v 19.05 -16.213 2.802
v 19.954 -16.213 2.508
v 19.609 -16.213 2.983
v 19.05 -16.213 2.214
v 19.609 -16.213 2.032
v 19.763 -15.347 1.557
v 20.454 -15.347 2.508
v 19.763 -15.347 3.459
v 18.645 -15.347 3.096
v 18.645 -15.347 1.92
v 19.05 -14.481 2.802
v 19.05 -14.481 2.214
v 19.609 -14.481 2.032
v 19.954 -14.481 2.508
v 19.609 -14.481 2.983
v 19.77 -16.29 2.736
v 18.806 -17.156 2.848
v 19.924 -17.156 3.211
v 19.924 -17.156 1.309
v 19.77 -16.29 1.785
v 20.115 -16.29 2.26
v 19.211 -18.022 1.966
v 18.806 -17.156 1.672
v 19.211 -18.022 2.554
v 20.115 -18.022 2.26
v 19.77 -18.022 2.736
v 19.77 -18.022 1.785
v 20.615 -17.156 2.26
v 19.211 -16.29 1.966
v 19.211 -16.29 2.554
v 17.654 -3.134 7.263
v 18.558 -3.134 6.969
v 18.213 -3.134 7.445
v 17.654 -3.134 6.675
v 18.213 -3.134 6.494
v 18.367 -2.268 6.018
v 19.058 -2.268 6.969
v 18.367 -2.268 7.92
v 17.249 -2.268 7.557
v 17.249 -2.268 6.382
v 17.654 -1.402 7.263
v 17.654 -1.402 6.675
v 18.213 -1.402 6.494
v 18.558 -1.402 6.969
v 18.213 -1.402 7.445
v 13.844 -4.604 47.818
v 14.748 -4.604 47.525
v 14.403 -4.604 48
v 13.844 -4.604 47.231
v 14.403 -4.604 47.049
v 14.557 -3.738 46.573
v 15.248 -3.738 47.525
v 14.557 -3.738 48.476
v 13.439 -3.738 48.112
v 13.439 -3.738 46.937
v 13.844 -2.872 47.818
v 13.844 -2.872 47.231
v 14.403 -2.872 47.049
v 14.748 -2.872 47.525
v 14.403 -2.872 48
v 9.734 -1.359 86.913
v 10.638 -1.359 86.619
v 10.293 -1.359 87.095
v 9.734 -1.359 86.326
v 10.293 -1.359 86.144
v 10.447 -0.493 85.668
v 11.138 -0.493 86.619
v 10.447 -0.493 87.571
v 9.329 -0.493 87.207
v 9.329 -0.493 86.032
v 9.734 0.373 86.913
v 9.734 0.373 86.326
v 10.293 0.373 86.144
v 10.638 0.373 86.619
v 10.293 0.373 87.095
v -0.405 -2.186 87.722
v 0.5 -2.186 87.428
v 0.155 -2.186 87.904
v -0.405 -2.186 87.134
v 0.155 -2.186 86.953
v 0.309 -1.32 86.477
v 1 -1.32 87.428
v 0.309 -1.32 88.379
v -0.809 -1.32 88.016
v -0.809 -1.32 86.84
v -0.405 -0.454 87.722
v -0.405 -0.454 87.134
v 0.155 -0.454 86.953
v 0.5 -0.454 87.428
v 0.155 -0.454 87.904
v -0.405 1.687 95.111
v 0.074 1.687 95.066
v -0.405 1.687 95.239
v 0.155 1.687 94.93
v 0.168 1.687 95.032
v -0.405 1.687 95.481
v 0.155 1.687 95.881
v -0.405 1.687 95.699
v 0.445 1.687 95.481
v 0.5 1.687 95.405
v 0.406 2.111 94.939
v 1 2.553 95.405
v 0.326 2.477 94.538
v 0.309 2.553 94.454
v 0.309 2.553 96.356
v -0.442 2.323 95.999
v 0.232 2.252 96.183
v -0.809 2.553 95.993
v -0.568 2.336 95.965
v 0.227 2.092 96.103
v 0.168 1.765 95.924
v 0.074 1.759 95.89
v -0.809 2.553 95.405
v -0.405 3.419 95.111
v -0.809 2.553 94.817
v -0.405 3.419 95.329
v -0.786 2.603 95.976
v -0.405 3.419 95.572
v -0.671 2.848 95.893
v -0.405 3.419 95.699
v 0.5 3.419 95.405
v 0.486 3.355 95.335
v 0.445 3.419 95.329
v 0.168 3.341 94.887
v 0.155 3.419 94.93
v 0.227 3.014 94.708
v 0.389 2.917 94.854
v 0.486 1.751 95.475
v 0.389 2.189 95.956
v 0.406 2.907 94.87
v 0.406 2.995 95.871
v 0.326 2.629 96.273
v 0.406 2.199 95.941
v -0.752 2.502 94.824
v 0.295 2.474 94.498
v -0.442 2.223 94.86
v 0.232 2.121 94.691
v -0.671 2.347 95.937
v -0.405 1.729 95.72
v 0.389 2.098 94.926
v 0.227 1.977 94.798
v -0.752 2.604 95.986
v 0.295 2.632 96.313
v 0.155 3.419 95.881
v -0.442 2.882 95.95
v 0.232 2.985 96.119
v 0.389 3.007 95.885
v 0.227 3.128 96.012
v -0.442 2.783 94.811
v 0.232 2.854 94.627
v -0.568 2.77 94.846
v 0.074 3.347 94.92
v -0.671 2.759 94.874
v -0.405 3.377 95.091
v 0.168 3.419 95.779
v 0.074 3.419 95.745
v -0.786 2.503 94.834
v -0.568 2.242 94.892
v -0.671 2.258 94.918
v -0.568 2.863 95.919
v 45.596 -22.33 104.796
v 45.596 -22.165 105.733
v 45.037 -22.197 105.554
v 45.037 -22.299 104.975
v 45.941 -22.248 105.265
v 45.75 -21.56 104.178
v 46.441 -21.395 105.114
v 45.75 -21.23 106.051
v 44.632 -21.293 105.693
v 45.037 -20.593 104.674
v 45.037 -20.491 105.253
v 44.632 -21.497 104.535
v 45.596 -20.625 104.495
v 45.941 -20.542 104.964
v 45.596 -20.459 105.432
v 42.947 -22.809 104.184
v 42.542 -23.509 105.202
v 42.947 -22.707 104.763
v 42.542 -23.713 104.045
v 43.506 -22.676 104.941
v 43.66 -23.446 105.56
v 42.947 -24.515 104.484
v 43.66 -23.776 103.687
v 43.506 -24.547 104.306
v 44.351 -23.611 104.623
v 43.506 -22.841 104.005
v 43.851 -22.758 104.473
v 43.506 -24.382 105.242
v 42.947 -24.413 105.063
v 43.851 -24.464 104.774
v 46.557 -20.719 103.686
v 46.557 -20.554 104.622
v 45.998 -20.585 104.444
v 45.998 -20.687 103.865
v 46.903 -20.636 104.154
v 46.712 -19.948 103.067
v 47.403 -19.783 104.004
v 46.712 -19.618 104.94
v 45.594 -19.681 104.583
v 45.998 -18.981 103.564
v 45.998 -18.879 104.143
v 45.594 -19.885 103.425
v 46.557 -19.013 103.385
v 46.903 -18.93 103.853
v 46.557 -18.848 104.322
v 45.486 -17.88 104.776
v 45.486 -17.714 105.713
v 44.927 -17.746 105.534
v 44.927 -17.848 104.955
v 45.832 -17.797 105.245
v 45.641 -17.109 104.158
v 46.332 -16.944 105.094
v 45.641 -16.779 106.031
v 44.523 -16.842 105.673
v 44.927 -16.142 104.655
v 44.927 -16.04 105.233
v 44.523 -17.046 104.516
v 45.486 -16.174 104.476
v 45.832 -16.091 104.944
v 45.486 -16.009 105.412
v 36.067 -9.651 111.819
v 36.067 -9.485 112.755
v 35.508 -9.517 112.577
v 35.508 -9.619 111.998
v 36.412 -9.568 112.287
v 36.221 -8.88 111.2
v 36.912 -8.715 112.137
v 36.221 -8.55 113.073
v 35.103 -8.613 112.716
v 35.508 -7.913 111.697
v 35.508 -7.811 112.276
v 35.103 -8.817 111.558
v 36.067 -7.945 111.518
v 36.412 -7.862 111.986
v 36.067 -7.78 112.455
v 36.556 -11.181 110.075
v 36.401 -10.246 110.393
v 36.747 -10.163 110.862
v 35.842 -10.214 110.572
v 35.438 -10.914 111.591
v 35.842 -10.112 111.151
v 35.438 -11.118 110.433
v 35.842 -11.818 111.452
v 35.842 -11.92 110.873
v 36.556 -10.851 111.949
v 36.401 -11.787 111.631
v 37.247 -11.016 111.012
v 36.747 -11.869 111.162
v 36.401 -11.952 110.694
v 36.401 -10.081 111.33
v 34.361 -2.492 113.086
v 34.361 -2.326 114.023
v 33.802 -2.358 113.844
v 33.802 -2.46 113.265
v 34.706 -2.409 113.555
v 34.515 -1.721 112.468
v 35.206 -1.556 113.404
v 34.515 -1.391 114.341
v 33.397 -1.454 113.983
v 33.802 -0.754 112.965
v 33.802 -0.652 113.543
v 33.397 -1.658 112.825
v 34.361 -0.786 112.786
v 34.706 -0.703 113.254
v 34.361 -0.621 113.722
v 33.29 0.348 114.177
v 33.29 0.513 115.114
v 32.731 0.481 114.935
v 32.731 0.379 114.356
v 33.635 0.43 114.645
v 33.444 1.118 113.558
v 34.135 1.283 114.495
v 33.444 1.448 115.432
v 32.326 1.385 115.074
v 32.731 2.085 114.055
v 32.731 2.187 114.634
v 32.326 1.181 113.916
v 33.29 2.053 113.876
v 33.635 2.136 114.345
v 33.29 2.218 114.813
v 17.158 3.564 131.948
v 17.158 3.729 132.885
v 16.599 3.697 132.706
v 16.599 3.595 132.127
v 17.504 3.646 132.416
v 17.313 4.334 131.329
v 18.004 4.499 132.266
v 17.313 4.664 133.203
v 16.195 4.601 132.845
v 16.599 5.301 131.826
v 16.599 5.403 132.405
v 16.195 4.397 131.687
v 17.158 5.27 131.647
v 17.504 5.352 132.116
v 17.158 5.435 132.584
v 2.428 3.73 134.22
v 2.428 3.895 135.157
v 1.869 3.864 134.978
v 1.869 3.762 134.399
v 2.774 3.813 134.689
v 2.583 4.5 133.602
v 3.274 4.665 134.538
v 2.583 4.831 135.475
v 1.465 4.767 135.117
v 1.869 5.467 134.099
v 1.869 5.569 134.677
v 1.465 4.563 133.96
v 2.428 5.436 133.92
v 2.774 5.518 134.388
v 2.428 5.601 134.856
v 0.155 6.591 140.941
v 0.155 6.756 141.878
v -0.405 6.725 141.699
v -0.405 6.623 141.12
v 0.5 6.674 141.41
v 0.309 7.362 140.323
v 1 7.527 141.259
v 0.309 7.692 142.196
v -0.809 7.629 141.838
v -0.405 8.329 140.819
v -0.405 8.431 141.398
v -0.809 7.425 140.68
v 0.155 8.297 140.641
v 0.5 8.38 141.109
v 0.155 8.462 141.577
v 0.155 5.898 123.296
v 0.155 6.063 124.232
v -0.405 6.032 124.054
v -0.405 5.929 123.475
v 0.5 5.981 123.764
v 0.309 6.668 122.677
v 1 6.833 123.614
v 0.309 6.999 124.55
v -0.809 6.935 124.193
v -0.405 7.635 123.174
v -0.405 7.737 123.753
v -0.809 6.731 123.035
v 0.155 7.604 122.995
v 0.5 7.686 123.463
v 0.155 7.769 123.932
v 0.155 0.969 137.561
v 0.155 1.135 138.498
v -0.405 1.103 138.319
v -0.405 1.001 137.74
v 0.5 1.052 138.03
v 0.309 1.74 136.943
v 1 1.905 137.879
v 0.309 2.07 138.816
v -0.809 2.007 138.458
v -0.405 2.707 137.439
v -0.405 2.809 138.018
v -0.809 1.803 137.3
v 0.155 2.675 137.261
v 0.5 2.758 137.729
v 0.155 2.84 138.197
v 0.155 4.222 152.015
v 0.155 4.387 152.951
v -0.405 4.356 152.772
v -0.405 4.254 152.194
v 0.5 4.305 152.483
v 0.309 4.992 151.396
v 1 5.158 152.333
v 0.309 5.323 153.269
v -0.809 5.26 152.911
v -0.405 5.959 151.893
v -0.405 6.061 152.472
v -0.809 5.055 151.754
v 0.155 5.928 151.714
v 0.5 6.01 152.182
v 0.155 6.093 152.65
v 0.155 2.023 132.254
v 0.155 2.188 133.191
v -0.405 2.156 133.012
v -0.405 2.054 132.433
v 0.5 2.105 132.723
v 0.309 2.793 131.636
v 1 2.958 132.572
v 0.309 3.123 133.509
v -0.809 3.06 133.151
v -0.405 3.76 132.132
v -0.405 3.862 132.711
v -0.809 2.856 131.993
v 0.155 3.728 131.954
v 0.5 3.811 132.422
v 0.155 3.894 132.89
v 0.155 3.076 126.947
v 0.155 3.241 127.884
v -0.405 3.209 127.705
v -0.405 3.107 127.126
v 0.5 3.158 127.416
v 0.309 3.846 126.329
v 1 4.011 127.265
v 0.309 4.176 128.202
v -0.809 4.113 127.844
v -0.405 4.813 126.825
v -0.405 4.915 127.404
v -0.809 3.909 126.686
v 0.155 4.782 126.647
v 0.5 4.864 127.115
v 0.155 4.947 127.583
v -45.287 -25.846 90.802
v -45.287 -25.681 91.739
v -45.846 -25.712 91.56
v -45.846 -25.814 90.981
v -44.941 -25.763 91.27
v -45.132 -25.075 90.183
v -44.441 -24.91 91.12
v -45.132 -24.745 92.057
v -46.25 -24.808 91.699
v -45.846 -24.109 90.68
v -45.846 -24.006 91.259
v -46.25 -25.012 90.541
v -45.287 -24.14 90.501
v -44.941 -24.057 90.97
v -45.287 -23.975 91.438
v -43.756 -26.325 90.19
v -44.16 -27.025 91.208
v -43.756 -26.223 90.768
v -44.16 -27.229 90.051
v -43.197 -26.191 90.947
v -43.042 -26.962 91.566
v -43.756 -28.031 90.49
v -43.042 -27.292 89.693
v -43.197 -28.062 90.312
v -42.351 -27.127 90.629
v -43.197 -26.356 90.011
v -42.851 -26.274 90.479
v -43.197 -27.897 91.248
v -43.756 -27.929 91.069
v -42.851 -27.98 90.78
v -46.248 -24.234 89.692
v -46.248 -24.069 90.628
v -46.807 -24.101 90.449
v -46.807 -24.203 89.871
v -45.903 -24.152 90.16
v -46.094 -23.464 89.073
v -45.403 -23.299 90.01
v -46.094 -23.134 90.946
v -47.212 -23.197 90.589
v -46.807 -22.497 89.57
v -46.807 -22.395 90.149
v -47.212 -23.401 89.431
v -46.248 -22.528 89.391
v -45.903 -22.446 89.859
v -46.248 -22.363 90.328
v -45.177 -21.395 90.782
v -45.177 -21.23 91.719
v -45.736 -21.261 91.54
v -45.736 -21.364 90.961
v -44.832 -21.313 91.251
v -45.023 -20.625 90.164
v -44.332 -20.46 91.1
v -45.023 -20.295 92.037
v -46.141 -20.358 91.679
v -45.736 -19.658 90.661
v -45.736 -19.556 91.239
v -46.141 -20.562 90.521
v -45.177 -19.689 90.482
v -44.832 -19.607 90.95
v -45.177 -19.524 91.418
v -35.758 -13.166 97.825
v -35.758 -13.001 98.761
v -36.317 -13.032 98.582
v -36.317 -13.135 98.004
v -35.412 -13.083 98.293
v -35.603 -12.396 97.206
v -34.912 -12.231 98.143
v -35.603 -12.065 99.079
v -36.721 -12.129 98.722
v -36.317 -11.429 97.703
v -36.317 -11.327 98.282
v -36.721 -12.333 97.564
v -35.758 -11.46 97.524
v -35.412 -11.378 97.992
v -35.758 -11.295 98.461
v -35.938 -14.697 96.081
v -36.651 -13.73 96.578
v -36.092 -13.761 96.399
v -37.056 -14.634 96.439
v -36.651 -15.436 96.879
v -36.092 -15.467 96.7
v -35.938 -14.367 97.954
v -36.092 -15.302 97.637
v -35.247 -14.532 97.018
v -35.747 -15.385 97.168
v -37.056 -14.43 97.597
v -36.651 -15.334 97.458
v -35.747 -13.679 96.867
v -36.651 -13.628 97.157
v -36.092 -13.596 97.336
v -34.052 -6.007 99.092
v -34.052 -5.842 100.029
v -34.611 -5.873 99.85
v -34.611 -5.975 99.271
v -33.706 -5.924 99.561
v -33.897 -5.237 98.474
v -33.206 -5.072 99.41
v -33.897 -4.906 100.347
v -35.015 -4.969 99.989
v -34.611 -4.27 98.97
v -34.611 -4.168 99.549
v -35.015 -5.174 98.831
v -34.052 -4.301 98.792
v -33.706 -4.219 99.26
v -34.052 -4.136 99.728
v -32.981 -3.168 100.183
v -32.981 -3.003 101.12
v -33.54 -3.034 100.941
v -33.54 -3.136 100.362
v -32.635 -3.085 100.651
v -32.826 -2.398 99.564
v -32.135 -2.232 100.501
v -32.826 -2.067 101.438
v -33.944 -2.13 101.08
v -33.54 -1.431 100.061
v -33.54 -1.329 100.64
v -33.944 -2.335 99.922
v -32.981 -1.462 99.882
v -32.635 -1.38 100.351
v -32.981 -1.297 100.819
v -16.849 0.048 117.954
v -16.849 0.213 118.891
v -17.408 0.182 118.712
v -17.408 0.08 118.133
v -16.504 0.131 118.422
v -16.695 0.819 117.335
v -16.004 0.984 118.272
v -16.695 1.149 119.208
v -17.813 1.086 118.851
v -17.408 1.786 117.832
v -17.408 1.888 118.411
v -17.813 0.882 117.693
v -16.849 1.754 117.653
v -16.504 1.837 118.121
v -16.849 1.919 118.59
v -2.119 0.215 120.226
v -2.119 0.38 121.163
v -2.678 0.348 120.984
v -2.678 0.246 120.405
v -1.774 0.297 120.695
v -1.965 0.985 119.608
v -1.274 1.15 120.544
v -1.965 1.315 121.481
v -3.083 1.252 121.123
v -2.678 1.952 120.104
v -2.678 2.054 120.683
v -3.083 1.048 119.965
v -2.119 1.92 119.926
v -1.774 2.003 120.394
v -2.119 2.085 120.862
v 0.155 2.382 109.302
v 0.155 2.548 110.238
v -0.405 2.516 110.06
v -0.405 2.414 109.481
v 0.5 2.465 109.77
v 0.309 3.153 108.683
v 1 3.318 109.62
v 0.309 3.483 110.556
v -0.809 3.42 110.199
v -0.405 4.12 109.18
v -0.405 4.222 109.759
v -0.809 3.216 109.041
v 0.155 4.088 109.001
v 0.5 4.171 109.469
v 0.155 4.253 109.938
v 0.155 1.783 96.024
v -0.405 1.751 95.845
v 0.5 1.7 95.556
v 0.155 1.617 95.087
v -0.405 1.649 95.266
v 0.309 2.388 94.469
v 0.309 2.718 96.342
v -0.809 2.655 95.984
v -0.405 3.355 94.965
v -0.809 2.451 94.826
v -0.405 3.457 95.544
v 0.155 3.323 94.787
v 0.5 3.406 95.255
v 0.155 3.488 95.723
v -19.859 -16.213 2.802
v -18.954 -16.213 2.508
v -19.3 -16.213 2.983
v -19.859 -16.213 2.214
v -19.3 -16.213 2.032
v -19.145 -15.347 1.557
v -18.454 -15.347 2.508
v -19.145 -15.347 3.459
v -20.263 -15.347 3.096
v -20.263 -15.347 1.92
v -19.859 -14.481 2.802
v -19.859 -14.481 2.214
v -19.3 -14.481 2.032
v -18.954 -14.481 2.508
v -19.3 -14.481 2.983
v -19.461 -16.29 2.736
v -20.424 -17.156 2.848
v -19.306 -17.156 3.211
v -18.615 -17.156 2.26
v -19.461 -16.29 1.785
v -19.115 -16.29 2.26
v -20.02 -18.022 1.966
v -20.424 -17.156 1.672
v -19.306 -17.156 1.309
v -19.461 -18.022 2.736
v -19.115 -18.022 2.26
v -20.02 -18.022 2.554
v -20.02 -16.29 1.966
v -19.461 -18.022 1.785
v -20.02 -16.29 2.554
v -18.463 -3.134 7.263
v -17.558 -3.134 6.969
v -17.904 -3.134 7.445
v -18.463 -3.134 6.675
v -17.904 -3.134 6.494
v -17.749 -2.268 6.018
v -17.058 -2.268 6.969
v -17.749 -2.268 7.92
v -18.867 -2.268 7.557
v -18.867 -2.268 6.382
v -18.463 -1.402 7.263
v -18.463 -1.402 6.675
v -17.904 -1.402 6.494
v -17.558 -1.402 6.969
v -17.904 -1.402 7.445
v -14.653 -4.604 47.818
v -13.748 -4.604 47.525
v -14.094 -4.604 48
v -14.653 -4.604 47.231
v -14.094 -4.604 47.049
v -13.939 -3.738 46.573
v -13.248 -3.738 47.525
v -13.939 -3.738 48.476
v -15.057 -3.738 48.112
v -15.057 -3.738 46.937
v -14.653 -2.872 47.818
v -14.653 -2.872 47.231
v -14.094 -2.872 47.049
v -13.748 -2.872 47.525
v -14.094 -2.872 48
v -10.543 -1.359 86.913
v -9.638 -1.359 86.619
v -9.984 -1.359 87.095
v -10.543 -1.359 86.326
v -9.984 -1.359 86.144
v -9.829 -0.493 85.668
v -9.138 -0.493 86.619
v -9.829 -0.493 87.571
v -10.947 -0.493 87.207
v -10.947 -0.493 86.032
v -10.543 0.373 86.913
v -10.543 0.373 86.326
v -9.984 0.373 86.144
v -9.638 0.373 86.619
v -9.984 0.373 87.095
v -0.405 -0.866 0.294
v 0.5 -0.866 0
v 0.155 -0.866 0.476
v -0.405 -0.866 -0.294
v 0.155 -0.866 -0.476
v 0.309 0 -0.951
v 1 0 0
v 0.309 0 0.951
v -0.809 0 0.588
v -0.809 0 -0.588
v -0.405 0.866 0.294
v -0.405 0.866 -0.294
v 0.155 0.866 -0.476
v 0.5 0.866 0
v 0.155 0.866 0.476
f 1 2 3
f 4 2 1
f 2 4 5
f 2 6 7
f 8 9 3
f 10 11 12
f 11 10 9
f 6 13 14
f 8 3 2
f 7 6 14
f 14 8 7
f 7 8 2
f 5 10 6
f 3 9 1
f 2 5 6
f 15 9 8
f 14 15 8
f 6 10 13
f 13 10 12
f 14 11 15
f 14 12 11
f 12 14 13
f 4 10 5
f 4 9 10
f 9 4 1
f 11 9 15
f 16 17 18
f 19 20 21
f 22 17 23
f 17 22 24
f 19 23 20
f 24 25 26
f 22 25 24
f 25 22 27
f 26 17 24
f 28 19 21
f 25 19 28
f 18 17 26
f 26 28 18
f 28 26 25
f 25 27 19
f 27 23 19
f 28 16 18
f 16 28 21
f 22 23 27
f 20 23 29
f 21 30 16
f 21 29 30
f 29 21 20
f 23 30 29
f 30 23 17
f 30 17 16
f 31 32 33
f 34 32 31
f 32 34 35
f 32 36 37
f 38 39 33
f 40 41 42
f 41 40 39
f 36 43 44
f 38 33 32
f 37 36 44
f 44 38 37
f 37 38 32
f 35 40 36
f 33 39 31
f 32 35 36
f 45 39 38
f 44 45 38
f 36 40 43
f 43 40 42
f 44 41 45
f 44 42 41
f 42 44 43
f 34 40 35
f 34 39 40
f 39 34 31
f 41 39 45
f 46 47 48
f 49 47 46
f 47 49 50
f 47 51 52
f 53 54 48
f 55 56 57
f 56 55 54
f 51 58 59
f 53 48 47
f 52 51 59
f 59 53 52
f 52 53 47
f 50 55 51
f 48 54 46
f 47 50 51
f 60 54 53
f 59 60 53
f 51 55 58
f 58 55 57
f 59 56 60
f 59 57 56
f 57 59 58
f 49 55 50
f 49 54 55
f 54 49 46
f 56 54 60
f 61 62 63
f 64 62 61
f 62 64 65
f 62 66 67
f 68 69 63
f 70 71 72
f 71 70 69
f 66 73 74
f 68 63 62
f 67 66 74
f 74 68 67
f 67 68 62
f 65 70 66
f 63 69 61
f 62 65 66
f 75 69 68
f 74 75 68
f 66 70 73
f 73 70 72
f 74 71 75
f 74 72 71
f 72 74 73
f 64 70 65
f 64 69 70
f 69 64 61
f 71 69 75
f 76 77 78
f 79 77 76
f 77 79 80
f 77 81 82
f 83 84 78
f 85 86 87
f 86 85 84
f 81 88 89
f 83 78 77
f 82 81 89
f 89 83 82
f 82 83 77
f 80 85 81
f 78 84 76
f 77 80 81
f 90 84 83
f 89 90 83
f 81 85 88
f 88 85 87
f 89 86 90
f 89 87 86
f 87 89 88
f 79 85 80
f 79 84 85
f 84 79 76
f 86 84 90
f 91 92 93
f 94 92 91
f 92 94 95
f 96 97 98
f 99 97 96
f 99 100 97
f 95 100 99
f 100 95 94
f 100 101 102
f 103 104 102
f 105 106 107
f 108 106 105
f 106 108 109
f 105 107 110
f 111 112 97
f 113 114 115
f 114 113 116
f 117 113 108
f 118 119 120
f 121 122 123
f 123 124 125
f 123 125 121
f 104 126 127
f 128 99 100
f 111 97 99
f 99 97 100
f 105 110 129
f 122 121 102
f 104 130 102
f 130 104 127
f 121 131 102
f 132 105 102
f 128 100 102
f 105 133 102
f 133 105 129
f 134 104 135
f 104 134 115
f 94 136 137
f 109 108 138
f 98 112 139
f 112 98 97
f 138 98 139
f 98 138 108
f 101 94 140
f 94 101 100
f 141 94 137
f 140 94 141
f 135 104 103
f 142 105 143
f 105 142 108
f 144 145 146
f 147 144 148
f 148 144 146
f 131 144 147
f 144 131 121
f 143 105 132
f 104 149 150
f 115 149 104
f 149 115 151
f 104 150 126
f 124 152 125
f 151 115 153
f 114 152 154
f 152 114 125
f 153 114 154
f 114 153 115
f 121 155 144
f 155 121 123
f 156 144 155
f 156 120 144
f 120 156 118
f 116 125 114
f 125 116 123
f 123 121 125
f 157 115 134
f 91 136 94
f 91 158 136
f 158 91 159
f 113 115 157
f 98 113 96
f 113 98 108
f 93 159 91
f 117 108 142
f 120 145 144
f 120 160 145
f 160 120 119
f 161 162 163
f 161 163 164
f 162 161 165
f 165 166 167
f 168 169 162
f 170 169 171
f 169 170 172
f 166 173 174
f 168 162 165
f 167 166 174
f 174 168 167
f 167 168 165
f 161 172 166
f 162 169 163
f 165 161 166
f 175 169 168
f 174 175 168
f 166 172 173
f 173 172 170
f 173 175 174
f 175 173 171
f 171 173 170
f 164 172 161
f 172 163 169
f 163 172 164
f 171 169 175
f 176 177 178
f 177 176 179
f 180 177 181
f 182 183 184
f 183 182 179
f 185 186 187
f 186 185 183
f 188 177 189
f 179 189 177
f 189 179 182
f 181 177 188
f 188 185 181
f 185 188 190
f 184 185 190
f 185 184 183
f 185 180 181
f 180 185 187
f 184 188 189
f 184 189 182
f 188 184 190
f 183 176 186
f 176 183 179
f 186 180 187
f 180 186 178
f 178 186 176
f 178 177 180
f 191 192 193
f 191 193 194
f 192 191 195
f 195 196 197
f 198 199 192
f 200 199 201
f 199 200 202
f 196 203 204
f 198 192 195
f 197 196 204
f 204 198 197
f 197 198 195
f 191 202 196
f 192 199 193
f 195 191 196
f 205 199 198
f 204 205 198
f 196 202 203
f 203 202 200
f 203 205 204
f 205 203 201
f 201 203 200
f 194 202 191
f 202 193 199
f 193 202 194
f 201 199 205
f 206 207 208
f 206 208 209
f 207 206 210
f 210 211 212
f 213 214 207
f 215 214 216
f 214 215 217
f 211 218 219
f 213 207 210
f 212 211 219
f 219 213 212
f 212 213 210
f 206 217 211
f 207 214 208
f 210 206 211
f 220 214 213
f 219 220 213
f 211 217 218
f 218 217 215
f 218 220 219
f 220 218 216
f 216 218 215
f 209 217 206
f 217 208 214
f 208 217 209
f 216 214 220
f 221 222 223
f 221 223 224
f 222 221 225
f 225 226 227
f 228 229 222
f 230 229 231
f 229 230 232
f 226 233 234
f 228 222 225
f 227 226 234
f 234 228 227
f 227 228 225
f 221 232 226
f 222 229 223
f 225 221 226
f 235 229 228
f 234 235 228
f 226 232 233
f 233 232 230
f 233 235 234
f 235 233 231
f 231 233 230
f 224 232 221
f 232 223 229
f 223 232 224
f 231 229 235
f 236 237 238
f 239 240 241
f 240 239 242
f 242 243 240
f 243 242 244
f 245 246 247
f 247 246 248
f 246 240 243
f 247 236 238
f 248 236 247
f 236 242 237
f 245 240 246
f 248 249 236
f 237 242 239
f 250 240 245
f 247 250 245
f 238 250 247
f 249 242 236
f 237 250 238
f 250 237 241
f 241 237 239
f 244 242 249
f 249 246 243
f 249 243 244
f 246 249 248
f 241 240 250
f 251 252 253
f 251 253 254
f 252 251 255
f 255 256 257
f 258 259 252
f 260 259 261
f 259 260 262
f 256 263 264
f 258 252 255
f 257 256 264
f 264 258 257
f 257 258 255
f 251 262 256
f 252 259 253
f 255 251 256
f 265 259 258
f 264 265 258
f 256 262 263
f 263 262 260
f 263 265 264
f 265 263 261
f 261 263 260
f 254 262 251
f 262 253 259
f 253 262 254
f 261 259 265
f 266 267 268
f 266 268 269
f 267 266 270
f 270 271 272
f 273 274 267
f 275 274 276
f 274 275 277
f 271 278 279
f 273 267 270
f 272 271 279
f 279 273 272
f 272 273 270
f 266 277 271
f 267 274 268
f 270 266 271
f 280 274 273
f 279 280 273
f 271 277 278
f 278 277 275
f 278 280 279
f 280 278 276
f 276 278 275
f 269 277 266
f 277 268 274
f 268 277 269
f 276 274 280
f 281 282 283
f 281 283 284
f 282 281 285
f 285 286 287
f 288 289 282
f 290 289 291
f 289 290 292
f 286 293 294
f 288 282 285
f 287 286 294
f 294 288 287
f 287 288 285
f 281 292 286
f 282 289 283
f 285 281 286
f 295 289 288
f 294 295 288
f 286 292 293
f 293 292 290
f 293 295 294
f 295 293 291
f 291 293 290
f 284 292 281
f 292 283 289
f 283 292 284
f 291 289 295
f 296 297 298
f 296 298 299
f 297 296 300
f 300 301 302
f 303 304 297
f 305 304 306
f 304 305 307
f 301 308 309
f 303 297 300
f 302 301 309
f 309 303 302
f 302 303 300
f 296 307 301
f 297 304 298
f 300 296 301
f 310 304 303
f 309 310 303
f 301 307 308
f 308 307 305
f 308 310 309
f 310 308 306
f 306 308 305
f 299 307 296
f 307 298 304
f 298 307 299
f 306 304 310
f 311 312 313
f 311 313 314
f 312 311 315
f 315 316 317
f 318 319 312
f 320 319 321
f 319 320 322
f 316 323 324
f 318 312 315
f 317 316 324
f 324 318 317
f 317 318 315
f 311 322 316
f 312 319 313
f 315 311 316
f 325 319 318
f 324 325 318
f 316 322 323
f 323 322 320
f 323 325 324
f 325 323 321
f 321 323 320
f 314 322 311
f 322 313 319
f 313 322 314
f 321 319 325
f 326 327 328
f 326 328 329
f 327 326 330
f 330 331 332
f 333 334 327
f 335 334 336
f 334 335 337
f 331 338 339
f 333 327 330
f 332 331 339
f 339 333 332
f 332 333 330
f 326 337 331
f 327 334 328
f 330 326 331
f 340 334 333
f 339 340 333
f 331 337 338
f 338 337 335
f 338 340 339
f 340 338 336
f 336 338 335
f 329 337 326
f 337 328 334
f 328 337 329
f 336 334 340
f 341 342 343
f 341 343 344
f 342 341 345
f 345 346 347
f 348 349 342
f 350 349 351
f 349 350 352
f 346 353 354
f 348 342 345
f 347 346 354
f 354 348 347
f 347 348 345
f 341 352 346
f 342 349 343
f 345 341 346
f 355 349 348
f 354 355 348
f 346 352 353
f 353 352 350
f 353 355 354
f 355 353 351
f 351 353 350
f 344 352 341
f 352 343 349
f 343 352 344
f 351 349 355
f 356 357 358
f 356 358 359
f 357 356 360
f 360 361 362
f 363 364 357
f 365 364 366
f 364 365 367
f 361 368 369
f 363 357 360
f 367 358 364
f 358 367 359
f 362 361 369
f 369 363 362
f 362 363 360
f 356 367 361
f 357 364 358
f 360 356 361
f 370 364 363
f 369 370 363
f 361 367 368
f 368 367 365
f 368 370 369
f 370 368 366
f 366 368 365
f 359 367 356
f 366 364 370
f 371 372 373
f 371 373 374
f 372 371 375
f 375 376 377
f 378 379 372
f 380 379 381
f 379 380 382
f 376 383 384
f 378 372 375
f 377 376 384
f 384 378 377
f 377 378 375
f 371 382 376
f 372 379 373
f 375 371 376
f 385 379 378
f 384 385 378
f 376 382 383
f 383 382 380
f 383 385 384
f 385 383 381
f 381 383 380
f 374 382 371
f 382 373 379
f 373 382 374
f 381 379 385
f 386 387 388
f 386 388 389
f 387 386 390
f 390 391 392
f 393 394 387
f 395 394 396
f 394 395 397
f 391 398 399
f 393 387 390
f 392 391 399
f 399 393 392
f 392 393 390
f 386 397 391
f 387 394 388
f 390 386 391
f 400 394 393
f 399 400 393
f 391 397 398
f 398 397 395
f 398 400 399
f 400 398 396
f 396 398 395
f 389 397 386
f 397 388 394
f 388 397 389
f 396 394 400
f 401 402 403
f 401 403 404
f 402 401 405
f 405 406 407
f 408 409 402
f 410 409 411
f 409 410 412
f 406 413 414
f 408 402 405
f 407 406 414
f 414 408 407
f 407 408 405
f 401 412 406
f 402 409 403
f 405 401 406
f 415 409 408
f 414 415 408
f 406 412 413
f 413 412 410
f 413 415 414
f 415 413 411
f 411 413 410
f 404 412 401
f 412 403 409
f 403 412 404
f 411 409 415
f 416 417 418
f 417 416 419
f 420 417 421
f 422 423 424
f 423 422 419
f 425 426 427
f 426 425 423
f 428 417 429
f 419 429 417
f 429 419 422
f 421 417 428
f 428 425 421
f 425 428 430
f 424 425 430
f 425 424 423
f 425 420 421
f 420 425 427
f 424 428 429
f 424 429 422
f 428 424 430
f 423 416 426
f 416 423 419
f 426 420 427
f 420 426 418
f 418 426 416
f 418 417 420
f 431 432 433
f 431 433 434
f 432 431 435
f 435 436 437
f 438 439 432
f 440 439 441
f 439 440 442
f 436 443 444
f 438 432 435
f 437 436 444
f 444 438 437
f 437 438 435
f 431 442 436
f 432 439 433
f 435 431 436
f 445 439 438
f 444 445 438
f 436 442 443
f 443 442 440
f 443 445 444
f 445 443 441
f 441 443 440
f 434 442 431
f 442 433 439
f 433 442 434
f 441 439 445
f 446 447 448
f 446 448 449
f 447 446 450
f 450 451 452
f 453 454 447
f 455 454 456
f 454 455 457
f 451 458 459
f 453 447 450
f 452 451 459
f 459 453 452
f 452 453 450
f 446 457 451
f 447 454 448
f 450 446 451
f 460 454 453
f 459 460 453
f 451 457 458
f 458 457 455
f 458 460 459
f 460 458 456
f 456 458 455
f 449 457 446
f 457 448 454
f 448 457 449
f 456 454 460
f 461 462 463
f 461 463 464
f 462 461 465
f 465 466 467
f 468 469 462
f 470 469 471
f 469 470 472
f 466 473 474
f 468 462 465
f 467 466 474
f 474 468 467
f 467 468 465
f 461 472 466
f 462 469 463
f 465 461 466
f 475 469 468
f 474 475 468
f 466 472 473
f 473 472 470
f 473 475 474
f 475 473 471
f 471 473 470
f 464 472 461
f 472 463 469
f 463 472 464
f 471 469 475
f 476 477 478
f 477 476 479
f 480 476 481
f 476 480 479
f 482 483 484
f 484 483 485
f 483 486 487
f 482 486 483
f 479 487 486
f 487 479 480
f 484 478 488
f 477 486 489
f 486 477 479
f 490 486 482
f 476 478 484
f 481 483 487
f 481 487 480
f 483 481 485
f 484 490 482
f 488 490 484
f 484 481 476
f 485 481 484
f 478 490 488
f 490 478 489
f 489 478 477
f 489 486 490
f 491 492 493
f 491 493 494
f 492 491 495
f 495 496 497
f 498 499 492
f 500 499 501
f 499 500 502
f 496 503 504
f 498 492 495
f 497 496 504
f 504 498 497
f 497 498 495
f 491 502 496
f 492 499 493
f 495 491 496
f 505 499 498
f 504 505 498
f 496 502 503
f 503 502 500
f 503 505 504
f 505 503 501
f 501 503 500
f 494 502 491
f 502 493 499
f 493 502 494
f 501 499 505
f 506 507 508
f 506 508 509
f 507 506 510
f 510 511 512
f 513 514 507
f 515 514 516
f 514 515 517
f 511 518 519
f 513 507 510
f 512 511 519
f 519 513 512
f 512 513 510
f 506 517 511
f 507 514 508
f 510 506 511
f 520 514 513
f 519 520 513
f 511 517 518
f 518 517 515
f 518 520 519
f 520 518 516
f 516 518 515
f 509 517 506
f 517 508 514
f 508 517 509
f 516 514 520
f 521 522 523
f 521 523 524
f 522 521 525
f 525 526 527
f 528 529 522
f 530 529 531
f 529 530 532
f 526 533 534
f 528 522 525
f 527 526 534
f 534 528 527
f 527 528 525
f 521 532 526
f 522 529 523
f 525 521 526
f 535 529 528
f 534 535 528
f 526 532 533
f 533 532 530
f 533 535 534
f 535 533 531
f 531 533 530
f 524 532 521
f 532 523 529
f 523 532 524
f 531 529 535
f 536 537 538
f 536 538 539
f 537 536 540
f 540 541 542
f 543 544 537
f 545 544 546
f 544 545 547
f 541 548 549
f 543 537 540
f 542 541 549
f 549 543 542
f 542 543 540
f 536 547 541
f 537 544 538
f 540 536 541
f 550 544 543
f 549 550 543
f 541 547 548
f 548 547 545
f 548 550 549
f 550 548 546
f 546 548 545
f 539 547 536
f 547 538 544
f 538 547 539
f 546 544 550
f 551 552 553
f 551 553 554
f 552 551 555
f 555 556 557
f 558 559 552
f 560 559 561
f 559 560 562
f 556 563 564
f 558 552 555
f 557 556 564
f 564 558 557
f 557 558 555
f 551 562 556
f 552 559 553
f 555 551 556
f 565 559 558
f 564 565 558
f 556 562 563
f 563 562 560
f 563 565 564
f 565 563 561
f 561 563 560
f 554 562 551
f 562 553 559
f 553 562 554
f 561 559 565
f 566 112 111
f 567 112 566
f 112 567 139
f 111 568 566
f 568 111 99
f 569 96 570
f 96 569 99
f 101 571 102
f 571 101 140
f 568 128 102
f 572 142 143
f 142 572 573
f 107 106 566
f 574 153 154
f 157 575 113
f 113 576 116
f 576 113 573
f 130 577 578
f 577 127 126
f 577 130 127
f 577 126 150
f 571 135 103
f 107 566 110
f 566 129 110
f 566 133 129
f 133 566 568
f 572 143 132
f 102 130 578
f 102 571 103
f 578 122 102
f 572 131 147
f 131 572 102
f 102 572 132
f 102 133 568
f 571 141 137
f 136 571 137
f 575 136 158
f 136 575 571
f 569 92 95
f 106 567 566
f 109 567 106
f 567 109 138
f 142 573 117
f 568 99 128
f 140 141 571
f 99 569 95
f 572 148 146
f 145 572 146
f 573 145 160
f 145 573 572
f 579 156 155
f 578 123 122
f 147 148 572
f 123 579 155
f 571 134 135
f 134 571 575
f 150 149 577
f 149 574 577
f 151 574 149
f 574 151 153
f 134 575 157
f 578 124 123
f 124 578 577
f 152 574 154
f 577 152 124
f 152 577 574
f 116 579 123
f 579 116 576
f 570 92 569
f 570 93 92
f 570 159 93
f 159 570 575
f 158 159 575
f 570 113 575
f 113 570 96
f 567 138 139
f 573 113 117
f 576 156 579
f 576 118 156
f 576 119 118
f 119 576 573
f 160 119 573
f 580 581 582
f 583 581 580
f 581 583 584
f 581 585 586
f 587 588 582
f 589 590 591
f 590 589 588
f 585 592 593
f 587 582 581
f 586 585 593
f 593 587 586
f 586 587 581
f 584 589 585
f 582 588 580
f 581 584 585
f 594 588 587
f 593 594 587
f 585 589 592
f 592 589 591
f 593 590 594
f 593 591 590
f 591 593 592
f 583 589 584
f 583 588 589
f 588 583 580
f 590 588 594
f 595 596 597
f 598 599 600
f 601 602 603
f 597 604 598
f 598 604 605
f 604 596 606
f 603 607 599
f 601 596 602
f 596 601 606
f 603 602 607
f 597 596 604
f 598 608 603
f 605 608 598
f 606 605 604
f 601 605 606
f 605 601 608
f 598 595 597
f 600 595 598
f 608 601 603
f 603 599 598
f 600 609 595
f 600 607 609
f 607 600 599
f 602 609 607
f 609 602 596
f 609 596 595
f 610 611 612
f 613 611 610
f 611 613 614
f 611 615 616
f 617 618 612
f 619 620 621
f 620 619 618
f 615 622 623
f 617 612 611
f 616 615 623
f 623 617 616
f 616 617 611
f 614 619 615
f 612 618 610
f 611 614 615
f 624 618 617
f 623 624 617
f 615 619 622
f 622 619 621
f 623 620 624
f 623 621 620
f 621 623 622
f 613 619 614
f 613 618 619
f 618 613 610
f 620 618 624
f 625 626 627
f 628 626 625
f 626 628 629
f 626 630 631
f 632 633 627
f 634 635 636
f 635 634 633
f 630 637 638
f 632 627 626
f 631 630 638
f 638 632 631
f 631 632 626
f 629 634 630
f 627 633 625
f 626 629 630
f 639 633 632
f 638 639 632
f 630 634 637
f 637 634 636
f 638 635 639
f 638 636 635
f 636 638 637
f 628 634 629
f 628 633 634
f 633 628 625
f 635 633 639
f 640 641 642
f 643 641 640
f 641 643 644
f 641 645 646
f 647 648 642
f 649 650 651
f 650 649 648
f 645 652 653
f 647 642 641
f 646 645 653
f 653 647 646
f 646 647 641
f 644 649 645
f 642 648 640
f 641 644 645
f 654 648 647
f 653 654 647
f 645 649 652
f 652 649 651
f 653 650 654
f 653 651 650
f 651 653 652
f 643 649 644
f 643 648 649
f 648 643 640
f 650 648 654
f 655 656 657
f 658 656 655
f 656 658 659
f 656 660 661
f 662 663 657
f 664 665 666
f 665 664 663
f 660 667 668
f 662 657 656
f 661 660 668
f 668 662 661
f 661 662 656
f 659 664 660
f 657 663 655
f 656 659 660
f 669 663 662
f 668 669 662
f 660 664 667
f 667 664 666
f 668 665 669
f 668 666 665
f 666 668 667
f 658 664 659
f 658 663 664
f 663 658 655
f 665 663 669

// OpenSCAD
 
rotate([90,0,0])	{
	 sphere(1);translate([	0.000000 , 87.428169 , 1.320417
	])rotate([00,0,0])	
  //JOINT __LHip//JOINT
	{{
		 sphere(1);translate([	0.000000 , 7.977084 , -3.873333
		])rotate([0,0,0])
		//JOINT LHip//JOINT
		{
			 sphere(1);translate([	-0.000000 , -7.977084 , 3.873333
			])rotate([0,0,0])
			//JOINT LeftUpLeg
			{
				 sphere(1);translate([	10.138167 , -0.808667 , -0.827375
				])rotate([0,0,0])
				//JOINT LeftLeg
				{
					 sphere(1);translate([	4.110207 , -39.094959 , 3.244875
					])rotate([0,0,0])
					//JOINT LeftFoot
					{
						 sphere(1);translate([	3.809875 , -40.555248 , -1.469958
						])rotate([0,0,0])
						//JOINT LeftToeBase
						{
							 sphere(1);translate([	1.395876 , -4.461508 , 13.078793
							])rotate([0,0,0])
								//End Site
								{
									 sphere(1);translate([	0.161166 ,-0.247698, 1.80971]) sphere(1);
								}
						}
					}
				}
			}
		}
	}
	//JOINT LowerBack
	{
		 sphere(1);translate([	0.000000 , 7.977084 , -3.873333
		])rotate([-10,0,0])
		//JOINT Spine
		{
			 sphere(1);translate([	-0.000000 , 14.131334 , 1.714916
			])rotate([0,0,0])
			//JOINT Spine1
			{
				 sphere(1);translate([	0.000000 , 14.391918 , -1.032000
				])rotate([0,0,0])
				//JOINT __LeftShoulder
				{
					 sphere(1);translate([	0.000000 , 17.497829 , 2.381333
					])rotate([0,0,0])
					//JOINT LeftShoulder
					{
						 sphere(1);translate([	2.273625 , -7.115664 , 1.650750
						])rotate([0,0,0])
						//JOINT LeftArm
						{
							 sphere(1);translate([	14.730333 , -2.266750 , -0.230958
							])rotate([0,0,0])
							//JOINT LeftForeArm
							{
								 sphere(1);translate([	16.131126 , -18.059462 , 0.081500
								])rotate([0,0,0])
								//JOINT LeftHand
								{
									 sphere(1);translate([	12.196541 , -12.422915 , 16.317875
									])rotate([0,0,0])
									//JOINT __LThumb
									{
										 sphere(1);translate([	1.071124 , -1.567081 , 2.606543
										])rotate([0,0,0])
										//JOINT LThumb
										{
											 sphere(1);translate([	-0.961380 , 0.813706 , 1.779957
											])rotate([0,0,0])
//												End Site
												{
													 sphere(1);translate([	-2.0902,	-0.868083,	2.0975]) sphere(1);
												}
										}
									}
									//JOINT LeftFingerBase
									{
										 sphere(1);translate([	1.071124 , -1.567081 , 2.606543
										])rotate([0,0,0])
										//JOINT LeftHandFinger1
										{
											 sphere(1);translate([	1.705961 , -2.491502 , 6.830206
											])rotate([0,0,0])
//												End Site
												{
													 sphere(1);translate([	0.334659,	-1.50733,	2.07083]) sphere(1);
												}
										}
									}
								}
							}
						}
					}
				}
				//JOINT Neck
				{
					 sphere(1);translate([	0.000000 , 17.497829 , 2.381333
					])rotate([0,0,0])
					//JOINT Neck1
					{
						 sphere(1);translate([	-0.000000 , 5.043497 , 1.958709
						])rotate([0,0,0])
						//JOINT Head
						{
							 sphere(1);translate([	-0.000000 , 5.043502 , 1.958709
							])rotate([0,0,0])
//								End Site
								{
									 sphere(1);translate([	0.0	,14.7986	,-0.693417]) sphere(1);
								}
						}
					}
				}
				//JOINT __RightShoulder
				{
					 sphere(1);translate([	0.000000 , 17.497829 , 2.381333
					])rotate([0,0,0])
					//JOINT RightShoulder
					{
						 sphere(1);translate([	-2.273625 , -7.115664 , 1.650750
						])rotate([0,0,0])
						//JOINT RightArm
						{
							 sphere(1);translate([	-14.730333 , -2.266750 , -0.230958
							])rotate([0,0,0])
							//JOINT RightForeArm
							{
								 sphere(1);translate([	-16.131126 , -18.059462 , 0.081500
								])rotate([0,0,0])
								//JOINT RightHand
								{
									 sphere(1);translate([	-12.196541 , -12.422915 , 16.317875
									])rotate([0,0,0])
									//JOINT __RThumb
									{
										 sphere(1);translate([	-1.071124 , -1.567081 , 2.606543
										])rotate([0,0,0])
										//JOINT RThumb
										{
											 sphere(1);translate([	0.961380 , 0.813706 , 1.779957
											])rotate([0,0,0])
//												End Site
												{
													 sphere(1);translate([	2.0902,	-0.868083,	2.0975]) sphere(1);
												}
										}
									}
									//JOINT RightFingerBase
									{
										 sphere(1);translate([	-1.071124 , -1.567081 , 2.606543
										])rotate([0,0,0])
										//JOINT RightHandFinger1
										{
											 sphere(1);translate([	-1.705961 , -2.491502 , 6.830206
											])rotate([0,0,0])
//												End Site
												{
 													 sphere(1);translate([	-0.334659,	-1.50733,	2.07083]) sphere(1);
												}
										}
									}
								}
							}
						}
					}
				}
			}
		}
	}
	//JOINT __RHip//JOINT
	{
		 sphere(1);translate([	0.000000 , 7.977084 , -3.873333
		])rotate([0,0,0])
		//JOINT RHip//JOINT
		{
			 sphere(1);translate([	-0.000000 , -7.977084 , 3.873333
			])rotate([0,0,0])
			//JOINT RightUpLeg
			{
				 sphere(1);translate([	-10.138167 , -0.808667 , -0.827375
				])rotate([0,0,0])
				//JOINT RightLeg
				{
					 sphere(1);translate([	-4.110207 , -39.094959 , 3.244875
					])rotate([0,0,0])
					//JOINT RightFoot
					{
						 sphere(1);translate([	-3.809875 , -40.555248 , -1.469958
						])rotate([0,0,0])
						//JOINT RightToeBase
						{
							 sphere(1);translate([	-1.395876 , -4.461508 , 13.078793
							])rotate([0,0,0])
//								End Site
								{
									 sphere(1);translate([	-0.161166,	-0.247698,	1.80971]) sphere(1);
								}
						}
					}
				}
			}
		}
	}
} }
